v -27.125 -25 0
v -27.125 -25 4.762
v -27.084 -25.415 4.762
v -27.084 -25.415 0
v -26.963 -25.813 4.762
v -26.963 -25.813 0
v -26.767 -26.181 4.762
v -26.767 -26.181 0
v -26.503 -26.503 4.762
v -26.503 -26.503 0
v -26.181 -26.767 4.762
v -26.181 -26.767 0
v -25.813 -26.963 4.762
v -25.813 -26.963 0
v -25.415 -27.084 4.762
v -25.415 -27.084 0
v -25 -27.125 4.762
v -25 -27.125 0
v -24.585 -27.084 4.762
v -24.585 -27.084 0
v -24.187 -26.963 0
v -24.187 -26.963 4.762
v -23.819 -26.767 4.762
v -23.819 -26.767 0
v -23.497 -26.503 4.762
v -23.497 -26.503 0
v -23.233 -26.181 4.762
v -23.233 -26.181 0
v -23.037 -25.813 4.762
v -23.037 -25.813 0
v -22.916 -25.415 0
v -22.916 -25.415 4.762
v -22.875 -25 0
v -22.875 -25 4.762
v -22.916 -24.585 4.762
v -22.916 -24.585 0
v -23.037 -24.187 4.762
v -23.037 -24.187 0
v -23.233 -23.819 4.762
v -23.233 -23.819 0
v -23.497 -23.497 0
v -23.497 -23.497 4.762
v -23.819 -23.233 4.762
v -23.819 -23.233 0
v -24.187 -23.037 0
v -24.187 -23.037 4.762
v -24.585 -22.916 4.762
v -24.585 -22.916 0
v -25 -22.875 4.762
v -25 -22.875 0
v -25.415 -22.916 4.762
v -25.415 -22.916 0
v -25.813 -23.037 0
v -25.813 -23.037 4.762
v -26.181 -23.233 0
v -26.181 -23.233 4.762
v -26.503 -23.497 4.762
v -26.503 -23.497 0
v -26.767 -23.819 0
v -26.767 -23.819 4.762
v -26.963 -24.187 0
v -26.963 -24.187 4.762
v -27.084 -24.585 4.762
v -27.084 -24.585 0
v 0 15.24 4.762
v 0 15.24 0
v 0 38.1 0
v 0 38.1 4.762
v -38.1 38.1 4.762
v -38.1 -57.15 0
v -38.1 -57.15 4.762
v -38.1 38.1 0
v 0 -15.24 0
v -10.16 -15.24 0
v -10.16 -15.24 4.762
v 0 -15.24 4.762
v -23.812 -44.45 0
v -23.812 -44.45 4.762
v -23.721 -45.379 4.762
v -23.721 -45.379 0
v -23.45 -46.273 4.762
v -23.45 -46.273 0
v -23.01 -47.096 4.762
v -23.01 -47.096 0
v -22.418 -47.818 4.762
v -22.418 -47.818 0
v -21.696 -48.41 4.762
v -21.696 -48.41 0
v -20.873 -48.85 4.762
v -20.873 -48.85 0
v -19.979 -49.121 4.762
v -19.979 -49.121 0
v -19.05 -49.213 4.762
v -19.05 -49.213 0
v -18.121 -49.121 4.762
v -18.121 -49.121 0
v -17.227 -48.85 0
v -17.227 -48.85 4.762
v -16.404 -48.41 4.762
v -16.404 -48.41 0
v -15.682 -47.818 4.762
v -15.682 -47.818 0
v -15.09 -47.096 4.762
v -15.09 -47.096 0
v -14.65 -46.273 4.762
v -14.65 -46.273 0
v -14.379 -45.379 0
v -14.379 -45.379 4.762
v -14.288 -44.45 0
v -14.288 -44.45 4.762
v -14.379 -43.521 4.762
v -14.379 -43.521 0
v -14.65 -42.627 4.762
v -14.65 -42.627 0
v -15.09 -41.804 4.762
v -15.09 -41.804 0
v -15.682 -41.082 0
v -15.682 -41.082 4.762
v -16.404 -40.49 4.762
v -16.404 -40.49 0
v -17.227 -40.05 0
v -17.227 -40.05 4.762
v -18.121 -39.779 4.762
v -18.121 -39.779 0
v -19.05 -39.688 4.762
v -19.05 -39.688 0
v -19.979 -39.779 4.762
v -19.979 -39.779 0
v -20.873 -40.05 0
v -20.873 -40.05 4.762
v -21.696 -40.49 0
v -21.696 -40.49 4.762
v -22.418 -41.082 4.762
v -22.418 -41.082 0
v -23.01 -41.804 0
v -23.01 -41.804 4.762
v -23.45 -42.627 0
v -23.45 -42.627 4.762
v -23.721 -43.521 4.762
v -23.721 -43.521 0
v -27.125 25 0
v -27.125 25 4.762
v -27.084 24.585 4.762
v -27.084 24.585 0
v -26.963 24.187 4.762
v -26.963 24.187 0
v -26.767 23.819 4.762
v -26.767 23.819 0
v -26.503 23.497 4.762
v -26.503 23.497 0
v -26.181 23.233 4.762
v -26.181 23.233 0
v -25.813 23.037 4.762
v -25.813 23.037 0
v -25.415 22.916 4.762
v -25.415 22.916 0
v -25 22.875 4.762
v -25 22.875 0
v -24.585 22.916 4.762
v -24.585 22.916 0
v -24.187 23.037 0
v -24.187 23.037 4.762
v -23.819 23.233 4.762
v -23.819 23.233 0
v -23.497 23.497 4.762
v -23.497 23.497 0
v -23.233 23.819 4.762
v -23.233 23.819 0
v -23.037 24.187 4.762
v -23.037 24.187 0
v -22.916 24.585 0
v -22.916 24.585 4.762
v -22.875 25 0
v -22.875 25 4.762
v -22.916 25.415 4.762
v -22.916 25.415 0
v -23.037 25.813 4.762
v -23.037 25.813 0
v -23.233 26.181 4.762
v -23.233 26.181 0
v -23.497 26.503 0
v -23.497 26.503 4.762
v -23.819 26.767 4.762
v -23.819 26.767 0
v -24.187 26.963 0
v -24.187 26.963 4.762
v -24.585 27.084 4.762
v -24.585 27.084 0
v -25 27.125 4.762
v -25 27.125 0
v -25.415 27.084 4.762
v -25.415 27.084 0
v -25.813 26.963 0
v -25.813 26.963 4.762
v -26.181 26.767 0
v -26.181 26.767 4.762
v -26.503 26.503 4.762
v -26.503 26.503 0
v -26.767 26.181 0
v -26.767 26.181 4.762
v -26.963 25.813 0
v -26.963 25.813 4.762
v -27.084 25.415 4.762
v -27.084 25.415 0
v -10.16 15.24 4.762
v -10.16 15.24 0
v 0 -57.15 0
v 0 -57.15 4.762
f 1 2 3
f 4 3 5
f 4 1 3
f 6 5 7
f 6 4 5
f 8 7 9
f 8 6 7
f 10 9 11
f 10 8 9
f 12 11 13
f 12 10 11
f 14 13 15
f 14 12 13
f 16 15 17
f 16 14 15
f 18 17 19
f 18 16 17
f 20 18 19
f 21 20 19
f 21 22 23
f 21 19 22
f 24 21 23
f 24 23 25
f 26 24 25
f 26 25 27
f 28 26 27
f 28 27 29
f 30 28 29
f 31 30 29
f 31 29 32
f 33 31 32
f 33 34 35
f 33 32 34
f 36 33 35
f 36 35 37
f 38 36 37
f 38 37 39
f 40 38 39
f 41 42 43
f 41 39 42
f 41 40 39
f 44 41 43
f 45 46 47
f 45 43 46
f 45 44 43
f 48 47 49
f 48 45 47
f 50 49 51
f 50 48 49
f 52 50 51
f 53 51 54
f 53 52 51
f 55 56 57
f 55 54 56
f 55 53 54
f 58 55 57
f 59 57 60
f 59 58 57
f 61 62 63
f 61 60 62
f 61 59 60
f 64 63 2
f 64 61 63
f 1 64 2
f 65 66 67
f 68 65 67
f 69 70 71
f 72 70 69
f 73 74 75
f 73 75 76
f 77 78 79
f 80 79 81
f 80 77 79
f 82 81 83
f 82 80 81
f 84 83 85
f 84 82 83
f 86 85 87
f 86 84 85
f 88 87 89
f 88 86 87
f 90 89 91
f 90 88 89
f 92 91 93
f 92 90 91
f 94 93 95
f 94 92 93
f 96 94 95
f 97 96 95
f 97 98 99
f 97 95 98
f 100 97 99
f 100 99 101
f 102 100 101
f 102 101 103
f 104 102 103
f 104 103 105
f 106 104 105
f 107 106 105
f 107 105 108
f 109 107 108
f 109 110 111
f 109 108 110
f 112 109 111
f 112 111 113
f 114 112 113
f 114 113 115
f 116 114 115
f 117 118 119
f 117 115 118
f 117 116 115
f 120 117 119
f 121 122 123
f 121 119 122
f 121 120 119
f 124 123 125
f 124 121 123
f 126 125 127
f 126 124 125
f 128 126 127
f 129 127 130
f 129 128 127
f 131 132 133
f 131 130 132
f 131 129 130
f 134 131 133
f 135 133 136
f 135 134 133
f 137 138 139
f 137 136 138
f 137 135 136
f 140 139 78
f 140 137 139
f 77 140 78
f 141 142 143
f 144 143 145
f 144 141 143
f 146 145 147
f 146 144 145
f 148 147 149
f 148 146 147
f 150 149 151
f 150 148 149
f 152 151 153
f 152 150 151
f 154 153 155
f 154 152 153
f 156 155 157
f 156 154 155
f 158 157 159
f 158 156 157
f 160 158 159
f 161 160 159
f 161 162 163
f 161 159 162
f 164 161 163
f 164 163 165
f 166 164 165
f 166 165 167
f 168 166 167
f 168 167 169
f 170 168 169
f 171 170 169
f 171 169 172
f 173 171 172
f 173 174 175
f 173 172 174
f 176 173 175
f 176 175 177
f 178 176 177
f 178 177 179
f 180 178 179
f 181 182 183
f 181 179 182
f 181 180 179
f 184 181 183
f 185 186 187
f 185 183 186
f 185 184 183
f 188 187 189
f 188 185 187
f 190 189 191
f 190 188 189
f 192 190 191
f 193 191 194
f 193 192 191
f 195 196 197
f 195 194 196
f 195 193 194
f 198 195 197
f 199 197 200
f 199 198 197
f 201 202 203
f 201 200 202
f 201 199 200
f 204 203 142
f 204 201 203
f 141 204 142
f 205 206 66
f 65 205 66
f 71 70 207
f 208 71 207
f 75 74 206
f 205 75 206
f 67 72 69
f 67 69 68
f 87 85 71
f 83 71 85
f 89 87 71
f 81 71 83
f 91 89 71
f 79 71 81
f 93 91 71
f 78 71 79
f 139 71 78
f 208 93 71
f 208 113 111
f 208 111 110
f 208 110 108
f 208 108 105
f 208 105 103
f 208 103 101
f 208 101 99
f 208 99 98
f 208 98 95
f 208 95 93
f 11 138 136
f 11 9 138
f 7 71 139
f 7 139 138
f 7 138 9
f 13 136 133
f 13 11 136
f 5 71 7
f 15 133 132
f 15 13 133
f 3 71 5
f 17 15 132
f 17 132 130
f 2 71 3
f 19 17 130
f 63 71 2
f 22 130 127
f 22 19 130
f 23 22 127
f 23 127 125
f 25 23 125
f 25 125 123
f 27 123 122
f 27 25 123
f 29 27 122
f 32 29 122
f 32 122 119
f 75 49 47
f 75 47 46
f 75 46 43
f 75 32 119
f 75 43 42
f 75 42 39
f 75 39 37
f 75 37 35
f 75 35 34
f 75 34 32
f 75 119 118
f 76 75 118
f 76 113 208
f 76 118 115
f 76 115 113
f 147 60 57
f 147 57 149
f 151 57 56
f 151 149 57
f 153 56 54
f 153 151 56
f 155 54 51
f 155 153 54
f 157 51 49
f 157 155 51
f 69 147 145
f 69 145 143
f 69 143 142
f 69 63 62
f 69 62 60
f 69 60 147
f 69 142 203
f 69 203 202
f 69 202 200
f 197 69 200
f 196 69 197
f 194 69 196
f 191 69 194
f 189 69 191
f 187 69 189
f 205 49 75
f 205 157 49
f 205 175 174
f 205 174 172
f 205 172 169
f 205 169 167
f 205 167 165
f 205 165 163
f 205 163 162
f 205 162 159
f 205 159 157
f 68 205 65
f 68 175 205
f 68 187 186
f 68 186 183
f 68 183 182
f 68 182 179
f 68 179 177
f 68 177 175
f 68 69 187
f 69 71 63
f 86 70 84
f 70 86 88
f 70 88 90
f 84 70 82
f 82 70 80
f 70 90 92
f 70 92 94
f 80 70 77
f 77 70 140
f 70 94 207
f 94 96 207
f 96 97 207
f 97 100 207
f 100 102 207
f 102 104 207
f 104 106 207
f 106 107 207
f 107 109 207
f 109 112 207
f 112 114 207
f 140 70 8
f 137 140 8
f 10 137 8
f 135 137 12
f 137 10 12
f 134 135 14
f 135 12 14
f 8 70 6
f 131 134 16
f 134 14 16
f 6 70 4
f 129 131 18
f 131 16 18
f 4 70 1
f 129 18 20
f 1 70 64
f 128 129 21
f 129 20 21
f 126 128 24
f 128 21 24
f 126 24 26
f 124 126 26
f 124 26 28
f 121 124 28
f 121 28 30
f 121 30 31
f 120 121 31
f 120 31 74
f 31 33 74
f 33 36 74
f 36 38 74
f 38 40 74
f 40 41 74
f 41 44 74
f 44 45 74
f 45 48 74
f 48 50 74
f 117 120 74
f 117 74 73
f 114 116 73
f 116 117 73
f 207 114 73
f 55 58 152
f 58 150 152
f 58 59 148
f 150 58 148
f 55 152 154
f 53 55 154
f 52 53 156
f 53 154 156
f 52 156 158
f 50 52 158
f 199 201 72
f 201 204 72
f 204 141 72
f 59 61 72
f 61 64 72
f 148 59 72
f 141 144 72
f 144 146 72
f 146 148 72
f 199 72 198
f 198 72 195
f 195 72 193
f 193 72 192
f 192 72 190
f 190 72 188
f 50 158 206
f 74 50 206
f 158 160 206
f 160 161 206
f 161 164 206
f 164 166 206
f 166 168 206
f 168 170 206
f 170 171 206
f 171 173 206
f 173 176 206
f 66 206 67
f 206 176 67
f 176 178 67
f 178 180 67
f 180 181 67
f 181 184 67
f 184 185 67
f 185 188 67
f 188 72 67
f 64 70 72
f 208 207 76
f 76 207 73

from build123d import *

# Parameters (mm, degrees)
SKETCH2_W           = 38.1
SKETCH2_H           = 95.25
BOSS_EXTRUDE1_DEPTH = 4.7625
SKETCH3_R           = 2.125
SKETCH3_R_2         = 4.7625
SKETCH3_W           = 10.16
SKETCH3_H           = 30.48
CUT_EXTRUDE3_DEPTH  = 69.850663804


with BuildPart() as part:
    # Sketch2 → Boss-Extrude1 (new body)
    with BuildSketch(Plane.XY):
        with Locations((-19.05, -9.525)):
            Rectangle(SKETCH2_W, SKETCH2_H)
    extrude(amount=BOSS_EXTRUDE1_DEPTH)

    # Sketch3 → Cut-Extrude3 (cut, through all)
    with BuildSketch(Plane.XY):
        with Locations(Location((-25, 25, 0), (0, 0, 180))):
            Circle(SKETCH3_R)
        with Locations((25, 25)):
            Circle(SKETCH3_R)
        with Locations((25, -25)):
            Circle(SKETCH3_R)
        with Locations(Location((-25, -25, 0), (0, 0, 180))):
            Circle(SKETCH3_R)
        with Locations(Location((-19.05, -44.45, 0), (0, 0, 180))):
            Circle(SKETCH3_R_2)
        with Locations((-5.08, 0)):
            Rectangle(SKETCH3_W, SKETCH3_H)
    extrude(amount=CUT_EXTRUDE3_DEPTH, mode=Mode.SUBTRACT)


solid = part.part
